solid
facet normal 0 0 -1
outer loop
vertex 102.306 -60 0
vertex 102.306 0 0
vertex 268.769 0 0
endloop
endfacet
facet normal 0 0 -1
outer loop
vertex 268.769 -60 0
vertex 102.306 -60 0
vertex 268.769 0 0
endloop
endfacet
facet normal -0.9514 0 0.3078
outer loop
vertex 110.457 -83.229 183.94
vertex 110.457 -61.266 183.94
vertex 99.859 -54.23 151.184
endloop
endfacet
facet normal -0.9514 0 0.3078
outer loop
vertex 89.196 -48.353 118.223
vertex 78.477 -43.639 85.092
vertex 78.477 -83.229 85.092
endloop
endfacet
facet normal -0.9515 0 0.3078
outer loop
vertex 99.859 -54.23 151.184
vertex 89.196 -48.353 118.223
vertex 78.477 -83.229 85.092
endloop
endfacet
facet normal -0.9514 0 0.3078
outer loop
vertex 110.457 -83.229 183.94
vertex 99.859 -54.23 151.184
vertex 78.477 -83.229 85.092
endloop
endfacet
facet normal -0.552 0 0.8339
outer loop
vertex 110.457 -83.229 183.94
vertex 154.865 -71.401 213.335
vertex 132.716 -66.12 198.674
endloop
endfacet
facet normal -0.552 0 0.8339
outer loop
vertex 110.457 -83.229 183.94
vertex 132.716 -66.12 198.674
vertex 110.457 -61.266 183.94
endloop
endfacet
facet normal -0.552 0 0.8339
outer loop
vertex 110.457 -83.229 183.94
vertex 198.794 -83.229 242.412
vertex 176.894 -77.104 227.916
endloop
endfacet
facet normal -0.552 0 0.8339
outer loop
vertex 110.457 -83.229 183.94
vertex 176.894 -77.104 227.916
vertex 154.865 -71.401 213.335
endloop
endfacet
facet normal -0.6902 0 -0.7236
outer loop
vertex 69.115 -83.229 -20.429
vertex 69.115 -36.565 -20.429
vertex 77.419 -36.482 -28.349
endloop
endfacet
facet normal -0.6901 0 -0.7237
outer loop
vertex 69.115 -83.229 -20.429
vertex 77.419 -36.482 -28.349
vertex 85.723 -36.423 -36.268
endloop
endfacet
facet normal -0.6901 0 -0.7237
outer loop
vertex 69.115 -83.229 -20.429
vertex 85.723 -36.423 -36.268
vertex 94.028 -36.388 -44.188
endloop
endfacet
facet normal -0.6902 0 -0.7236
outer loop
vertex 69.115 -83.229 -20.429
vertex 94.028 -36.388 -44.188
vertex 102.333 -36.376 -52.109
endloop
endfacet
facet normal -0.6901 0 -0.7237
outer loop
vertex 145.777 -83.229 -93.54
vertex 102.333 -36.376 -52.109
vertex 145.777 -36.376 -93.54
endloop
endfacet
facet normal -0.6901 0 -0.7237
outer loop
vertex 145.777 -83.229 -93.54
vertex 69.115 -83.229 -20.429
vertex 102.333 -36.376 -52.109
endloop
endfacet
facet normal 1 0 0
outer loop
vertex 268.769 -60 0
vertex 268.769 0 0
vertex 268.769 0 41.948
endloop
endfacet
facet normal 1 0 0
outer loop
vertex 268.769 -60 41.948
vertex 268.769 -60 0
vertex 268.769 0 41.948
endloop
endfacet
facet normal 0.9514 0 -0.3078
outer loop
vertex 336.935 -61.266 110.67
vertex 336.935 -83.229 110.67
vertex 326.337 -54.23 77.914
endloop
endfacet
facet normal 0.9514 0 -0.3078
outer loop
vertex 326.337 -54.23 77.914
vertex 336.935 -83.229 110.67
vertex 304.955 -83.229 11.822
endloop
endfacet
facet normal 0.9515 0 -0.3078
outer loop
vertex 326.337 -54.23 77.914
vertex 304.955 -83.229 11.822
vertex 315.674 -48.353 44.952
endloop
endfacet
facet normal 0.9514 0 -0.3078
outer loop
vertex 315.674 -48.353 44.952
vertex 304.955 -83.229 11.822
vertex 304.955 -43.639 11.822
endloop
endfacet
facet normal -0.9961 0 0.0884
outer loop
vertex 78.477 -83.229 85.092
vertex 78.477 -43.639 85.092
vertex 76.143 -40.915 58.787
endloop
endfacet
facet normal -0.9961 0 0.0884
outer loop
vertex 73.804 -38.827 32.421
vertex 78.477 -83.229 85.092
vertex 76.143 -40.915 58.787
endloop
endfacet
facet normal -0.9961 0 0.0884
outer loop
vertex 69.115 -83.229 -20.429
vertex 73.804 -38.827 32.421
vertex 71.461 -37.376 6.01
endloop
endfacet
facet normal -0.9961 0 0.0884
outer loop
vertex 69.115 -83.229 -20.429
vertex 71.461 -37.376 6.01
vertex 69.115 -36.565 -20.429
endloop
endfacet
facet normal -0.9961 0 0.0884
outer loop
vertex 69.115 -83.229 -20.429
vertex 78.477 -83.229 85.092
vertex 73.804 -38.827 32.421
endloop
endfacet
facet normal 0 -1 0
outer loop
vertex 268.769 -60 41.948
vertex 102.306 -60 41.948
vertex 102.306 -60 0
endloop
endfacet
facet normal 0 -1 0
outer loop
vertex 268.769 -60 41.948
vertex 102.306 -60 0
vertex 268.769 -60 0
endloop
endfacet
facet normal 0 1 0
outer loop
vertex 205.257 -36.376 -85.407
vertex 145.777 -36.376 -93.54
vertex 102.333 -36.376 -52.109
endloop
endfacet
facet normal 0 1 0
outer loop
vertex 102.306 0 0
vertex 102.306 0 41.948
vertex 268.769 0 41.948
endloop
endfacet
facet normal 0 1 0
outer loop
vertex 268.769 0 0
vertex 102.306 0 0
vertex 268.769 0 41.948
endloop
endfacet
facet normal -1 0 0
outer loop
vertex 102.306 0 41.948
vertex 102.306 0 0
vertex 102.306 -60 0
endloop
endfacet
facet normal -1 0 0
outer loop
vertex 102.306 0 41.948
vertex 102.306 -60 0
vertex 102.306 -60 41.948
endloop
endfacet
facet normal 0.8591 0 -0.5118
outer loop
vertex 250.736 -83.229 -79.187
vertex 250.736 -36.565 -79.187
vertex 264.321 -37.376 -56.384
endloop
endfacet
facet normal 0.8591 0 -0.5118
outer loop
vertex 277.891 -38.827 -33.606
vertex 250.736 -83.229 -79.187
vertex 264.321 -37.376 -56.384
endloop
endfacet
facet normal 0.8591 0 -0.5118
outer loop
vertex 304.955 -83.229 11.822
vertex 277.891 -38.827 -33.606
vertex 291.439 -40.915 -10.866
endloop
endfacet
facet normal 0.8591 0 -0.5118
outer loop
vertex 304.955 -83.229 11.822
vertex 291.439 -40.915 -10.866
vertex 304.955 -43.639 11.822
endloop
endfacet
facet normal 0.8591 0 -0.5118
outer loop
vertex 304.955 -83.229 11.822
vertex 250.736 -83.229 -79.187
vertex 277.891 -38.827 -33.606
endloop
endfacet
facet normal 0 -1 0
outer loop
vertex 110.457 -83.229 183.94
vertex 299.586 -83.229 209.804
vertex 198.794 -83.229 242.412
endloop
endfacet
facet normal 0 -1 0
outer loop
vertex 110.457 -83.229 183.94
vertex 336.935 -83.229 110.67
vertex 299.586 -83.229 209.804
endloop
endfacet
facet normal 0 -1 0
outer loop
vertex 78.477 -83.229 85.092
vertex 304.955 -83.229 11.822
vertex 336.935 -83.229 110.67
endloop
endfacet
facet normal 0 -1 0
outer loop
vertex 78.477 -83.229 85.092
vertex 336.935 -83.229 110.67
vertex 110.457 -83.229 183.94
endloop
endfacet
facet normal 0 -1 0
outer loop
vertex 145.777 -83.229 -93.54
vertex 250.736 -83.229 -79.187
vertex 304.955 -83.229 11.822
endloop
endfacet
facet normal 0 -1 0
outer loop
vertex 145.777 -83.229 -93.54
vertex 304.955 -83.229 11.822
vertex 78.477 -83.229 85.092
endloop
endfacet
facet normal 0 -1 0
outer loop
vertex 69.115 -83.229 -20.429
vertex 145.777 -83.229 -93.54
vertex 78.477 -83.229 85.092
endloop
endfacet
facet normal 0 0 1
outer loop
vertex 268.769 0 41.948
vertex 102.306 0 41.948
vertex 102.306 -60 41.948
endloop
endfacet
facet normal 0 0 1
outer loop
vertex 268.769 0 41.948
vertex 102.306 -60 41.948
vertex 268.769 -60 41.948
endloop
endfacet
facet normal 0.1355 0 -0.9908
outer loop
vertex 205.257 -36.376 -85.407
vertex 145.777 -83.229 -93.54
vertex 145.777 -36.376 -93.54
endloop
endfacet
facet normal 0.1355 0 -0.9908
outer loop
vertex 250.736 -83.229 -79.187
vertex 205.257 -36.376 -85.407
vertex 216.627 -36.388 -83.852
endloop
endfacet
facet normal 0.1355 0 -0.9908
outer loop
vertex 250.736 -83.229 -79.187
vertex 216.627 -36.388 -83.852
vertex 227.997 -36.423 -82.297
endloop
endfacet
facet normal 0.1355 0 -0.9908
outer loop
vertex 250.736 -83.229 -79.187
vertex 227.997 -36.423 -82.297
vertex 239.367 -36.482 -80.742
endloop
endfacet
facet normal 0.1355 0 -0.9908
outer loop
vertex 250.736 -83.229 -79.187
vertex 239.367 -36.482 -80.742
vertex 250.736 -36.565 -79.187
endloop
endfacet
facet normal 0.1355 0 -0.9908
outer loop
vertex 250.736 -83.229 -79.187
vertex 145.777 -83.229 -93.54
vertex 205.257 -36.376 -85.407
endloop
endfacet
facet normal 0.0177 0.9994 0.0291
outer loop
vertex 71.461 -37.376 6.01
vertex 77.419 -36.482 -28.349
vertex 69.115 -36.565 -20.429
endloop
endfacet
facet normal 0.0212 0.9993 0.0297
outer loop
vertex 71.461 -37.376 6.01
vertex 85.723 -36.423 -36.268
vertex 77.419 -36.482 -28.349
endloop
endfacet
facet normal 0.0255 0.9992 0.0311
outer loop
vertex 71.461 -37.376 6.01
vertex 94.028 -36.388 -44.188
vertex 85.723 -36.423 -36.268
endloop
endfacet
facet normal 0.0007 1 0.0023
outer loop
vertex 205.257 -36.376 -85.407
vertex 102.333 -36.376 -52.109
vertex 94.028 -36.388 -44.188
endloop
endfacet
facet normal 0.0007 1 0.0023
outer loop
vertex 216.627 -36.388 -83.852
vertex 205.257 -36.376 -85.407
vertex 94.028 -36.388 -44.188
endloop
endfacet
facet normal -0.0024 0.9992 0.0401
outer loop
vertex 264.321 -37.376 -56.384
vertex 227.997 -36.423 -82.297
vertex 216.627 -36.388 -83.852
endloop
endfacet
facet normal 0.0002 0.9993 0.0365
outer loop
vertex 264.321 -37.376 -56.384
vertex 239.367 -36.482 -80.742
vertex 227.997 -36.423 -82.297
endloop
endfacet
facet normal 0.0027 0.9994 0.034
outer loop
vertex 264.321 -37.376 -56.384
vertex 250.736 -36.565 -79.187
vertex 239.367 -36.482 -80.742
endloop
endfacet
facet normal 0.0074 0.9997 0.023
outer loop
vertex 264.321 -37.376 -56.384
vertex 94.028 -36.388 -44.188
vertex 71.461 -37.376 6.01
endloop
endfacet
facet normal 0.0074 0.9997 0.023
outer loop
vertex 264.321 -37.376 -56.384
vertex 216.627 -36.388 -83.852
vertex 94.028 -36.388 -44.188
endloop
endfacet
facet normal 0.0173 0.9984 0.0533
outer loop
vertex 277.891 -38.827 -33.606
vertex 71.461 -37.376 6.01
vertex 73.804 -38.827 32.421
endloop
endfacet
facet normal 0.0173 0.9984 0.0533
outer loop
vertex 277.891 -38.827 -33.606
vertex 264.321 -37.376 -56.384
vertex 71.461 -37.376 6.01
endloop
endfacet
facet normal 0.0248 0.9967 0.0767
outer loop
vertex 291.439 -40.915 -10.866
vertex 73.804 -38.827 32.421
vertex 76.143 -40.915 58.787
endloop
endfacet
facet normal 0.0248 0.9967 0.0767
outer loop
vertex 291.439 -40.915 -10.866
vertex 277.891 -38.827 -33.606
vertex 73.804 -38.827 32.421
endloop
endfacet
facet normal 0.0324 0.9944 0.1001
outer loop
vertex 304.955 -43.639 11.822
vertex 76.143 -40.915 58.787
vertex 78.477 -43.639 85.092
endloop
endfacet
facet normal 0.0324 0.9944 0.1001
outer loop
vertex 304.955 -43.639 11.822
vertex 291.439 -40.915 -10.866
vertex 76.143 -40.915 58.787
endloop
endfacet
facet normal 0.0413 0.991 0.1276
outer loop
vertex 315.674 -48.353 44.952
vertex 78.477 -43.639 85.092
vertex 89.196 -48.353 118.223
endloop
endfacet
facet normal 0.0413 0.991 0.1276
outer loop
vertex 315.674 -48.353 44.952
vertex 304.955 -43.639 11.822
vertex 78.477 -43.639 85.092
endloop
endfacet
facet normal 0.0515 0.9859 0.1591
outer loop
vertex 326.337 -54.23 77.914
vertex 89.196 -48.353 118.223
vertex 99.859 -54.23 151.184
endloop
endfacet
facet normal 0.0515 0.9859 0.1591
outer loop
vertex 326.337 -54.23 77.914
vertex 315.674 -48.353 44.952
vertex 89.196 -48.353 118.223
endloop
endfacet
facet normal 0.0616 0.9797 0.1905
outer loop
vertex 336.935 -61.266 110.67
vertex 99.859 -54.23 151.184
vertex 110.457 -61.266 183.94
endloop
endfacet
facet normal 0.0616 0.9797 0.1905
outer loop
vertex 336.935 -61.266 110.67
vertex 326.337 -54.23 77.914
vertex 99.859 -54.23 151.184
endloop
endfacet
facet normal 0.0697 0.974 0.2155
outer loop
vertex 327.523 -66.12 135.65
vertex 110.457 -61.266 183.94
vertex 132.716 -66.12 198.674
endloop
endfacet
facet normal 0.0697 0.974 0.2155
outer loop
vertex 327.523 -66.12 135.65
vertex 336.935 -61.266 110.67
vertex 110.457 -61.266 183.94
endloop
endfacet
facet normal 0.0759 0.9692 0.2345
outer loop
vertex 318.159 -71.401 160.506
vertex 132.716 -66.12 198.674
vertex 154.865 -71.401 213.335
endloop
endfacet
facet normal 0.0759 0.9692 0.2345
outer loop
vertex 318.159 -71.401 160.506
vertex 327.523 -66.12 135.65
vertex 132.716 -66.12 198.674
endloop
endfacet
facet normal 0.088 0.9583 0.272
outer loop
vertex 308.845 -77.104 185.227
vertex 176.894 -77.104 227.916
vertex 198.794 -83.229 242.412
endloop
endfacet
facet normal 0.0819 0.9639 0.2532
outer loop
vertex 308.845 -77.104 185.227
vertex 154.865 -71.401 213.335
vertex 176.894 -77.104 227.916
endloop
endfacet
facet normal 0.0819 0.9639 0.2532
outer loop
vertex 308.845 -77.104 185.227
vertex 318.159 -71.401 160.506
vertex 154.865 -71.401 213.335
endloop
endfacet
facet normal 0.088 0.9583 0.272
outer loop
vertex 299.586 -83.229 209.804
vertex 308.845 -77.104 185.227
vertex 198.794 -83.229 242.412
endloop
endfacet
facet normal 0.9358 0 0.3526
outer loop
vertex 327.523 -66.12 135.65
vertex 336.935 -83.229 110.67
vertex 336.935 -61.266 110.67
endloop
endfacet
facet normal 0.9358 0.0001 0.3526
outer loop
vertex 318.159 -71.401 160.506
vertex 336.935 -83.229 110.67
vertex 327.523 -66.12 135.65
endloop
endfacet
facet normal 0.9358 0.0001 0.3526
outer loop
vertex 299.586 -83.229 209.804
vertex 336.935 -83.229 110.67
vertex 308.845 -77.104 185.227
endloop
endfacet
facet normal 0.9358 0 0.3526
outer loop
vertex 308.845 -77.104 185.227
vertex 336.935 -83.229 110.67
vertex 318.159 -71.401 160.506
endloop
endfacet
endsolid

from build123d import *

# Parameters (mm, degrees)
F0_W        = 166.4632111788
F0_H        = 41.9475100935
F2_DEPTH    = 59.9997173995
F4_DEPTH    = 23.426502943
F5_DEPTH    = 103.8927901536
F6_T1_DEPTH = 1655.4987810503


# Not quite as in the source:
# - a fillet or chamfer that OpenCascade refuses, or shapes differently, is made with other operations: its cross-section is extruded or revolved along the edge and cut away or added


with BuildPart() as f2:
    # F0 (on Front) → F2 (new body)
    with BuildSketch(Plane.XZ):
        with Locations((185.5375096202, 20.9737550467)):
            Rectangle(F0_W, F0_H)
    extrude(amount=F2_DEPTH)


with BuildPart() as f4:
    # F3 (on offset) → F4 (new body, symmetric)
    with BuildSketch(Plane.XZ.offset(59.8023701459)):
        Polygon((304.9551667814, 11.8217294328), (267.6064548846, 110.9551588781), (166.814277799, 143.5634423701), (78.4772006558, 85.0918773514), (69.1148442917, -20.4292551163), (145.7772540063, -93.5403900459), (250.7360716562, -79.1873516402), align=None)
    extrude(amount=F4_DEPTH, both=True)

    # F5 (add): faces of the model
    f5_faces = [f4.faces().sort_by_distance(p)[0] for p in [
        (217.2103663418, -59.8023701459, 127.2593006241),
        (122.6457392274, -59.8023701459, 114.3276598607),
        (73.7960224737, -59.8023701459, 32.3313111175),
        (107.446049149, -59.8023701459, -56.9848225811),
        (198.2566628312, -59.8023701459, -86.3638708431),
        (277.8456192188, -59.8023701459, -33.6828111037),
        (286.280810833, -59.8023701459, 61.3884441555),
    ]]
    extrude(f5_faces, amount=F5_DEPTH, dir=(0.3078121651, 0, 0.9514471457))

    # F6: fillet of radius 1048.3963355256 on 3 edges, made by hand

    # F6_s2 → F6_t1 (cut)
    with BuildSketch(Plane(origin=(946.9197916988, 0, -306.3474756142), x_dir=(0, 1, 0), z_dir=(-0.9514471457, 0, 0.3078121651))):
        with BuildLine():
            ThreePointArc((-36.3758672029, 18.0793434638), (-48.1552934974, -138.6377897402), (-83.228873089, -291.833281639))
            Line((-83.228873089, -291.833281639), (-36.3758672029, -291.833281639))
            Line((-36.3758672029, -291.833281639), (-36.3758672029, 18.0793434638))
        make_face()
    extrude(amount=F6_T1_DEPTH, mode=Mode.SUBTRACT)


solid = Compound([f2.part, f4.part])
